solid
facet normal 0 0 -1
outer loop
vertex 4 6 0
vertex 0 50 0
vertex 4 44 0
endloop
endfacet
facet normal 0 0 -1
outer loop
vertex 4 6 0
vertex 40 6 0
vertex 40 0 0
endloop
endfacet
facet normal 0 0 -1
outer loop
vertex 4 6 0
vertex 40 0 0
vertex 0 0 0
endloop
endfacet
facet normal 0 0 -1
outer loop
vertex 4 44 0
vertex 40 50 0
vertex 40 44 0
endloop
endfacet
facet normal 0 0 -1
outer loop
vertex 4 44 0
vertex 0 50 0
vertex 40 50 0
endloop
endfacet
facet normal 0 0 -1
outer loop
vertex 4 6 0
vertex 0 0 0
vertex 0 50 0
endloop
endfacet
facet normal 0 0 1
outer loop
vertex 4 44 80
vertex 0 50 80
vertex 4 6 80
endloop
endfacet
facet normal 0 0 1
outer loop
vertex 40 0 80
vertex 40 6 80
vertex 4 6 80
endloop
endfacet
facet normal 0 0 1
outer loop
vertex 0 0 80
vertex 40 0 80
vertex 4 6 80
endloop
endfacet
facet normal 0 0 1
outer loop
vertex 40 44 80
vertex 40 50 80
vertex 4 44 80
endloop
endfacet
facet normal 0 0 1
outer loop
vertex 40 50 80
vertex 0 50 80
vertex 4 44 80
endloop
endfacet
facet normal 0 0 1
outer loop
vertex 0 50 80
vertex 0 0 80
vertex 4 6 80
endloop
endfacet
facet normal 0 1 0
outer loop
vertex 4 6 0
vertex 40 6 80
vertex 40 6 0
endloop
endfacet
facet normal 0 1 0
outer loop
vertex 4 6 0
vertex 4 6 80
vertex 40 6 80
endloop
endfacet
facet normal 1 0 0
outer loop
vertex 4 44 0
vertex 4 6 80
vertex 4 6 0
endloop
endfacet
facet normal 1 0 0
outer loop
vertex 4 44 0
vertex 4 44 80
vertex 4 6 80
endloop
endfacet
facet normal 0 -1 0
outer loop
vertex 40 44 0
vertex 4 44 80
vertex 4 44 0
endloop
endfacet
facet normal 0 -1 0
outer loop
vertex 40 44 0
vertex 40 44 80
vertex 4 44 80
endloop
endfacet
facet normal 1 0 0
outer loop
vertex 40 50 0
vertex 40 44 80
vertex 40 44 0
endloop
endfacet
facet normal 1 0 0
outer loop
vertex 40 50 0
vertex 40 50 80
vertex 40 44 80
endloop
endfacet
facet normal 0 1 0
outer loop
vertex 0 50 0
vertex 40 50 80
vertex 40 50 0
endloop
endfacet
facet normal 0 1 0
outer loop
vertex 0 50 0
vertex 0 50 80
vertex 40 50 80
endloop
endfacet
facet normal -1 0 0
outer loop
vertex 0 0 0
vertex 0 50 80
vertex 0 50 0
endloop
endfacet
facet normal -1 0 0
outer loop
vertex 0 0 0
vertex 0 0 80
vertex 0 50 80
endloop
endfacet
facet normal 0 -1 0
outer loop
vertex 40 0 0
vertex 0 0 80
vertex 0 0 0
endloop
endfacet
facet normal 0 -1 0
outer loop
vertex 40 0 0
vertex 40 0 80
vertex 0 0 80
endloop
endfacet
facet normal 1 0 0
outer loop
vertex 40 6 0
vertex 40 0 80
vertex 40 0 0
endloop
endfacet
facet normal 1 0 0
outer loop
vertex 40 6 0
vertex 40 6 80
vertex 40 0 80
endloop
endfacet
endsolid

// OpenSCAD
$fn = 32;

// ----------------------------------------------------------------------
// Structural section: channel 40 x 50 mm
// ----------------------------------------------------------------------

// --- parameters (mm) ---
sec_w = 40;               // channel width, X
sec_h = 50;               // channel height, Y
flange_t = 6;             // flange thickness
web_t = 4;                // web thickness
plate_t = 80;             // cut length, Z (extrusion height)

profile = [[0, 0], [40, 0], [40, 6], [4, 6], [4, 44], [40, 44], [40, 50], [0, 50]];  // primary outline, 8 points, counter clockwise

// --- the one profile operation ---
linear_extrude(height = plate_t) polygon(points = profile);
